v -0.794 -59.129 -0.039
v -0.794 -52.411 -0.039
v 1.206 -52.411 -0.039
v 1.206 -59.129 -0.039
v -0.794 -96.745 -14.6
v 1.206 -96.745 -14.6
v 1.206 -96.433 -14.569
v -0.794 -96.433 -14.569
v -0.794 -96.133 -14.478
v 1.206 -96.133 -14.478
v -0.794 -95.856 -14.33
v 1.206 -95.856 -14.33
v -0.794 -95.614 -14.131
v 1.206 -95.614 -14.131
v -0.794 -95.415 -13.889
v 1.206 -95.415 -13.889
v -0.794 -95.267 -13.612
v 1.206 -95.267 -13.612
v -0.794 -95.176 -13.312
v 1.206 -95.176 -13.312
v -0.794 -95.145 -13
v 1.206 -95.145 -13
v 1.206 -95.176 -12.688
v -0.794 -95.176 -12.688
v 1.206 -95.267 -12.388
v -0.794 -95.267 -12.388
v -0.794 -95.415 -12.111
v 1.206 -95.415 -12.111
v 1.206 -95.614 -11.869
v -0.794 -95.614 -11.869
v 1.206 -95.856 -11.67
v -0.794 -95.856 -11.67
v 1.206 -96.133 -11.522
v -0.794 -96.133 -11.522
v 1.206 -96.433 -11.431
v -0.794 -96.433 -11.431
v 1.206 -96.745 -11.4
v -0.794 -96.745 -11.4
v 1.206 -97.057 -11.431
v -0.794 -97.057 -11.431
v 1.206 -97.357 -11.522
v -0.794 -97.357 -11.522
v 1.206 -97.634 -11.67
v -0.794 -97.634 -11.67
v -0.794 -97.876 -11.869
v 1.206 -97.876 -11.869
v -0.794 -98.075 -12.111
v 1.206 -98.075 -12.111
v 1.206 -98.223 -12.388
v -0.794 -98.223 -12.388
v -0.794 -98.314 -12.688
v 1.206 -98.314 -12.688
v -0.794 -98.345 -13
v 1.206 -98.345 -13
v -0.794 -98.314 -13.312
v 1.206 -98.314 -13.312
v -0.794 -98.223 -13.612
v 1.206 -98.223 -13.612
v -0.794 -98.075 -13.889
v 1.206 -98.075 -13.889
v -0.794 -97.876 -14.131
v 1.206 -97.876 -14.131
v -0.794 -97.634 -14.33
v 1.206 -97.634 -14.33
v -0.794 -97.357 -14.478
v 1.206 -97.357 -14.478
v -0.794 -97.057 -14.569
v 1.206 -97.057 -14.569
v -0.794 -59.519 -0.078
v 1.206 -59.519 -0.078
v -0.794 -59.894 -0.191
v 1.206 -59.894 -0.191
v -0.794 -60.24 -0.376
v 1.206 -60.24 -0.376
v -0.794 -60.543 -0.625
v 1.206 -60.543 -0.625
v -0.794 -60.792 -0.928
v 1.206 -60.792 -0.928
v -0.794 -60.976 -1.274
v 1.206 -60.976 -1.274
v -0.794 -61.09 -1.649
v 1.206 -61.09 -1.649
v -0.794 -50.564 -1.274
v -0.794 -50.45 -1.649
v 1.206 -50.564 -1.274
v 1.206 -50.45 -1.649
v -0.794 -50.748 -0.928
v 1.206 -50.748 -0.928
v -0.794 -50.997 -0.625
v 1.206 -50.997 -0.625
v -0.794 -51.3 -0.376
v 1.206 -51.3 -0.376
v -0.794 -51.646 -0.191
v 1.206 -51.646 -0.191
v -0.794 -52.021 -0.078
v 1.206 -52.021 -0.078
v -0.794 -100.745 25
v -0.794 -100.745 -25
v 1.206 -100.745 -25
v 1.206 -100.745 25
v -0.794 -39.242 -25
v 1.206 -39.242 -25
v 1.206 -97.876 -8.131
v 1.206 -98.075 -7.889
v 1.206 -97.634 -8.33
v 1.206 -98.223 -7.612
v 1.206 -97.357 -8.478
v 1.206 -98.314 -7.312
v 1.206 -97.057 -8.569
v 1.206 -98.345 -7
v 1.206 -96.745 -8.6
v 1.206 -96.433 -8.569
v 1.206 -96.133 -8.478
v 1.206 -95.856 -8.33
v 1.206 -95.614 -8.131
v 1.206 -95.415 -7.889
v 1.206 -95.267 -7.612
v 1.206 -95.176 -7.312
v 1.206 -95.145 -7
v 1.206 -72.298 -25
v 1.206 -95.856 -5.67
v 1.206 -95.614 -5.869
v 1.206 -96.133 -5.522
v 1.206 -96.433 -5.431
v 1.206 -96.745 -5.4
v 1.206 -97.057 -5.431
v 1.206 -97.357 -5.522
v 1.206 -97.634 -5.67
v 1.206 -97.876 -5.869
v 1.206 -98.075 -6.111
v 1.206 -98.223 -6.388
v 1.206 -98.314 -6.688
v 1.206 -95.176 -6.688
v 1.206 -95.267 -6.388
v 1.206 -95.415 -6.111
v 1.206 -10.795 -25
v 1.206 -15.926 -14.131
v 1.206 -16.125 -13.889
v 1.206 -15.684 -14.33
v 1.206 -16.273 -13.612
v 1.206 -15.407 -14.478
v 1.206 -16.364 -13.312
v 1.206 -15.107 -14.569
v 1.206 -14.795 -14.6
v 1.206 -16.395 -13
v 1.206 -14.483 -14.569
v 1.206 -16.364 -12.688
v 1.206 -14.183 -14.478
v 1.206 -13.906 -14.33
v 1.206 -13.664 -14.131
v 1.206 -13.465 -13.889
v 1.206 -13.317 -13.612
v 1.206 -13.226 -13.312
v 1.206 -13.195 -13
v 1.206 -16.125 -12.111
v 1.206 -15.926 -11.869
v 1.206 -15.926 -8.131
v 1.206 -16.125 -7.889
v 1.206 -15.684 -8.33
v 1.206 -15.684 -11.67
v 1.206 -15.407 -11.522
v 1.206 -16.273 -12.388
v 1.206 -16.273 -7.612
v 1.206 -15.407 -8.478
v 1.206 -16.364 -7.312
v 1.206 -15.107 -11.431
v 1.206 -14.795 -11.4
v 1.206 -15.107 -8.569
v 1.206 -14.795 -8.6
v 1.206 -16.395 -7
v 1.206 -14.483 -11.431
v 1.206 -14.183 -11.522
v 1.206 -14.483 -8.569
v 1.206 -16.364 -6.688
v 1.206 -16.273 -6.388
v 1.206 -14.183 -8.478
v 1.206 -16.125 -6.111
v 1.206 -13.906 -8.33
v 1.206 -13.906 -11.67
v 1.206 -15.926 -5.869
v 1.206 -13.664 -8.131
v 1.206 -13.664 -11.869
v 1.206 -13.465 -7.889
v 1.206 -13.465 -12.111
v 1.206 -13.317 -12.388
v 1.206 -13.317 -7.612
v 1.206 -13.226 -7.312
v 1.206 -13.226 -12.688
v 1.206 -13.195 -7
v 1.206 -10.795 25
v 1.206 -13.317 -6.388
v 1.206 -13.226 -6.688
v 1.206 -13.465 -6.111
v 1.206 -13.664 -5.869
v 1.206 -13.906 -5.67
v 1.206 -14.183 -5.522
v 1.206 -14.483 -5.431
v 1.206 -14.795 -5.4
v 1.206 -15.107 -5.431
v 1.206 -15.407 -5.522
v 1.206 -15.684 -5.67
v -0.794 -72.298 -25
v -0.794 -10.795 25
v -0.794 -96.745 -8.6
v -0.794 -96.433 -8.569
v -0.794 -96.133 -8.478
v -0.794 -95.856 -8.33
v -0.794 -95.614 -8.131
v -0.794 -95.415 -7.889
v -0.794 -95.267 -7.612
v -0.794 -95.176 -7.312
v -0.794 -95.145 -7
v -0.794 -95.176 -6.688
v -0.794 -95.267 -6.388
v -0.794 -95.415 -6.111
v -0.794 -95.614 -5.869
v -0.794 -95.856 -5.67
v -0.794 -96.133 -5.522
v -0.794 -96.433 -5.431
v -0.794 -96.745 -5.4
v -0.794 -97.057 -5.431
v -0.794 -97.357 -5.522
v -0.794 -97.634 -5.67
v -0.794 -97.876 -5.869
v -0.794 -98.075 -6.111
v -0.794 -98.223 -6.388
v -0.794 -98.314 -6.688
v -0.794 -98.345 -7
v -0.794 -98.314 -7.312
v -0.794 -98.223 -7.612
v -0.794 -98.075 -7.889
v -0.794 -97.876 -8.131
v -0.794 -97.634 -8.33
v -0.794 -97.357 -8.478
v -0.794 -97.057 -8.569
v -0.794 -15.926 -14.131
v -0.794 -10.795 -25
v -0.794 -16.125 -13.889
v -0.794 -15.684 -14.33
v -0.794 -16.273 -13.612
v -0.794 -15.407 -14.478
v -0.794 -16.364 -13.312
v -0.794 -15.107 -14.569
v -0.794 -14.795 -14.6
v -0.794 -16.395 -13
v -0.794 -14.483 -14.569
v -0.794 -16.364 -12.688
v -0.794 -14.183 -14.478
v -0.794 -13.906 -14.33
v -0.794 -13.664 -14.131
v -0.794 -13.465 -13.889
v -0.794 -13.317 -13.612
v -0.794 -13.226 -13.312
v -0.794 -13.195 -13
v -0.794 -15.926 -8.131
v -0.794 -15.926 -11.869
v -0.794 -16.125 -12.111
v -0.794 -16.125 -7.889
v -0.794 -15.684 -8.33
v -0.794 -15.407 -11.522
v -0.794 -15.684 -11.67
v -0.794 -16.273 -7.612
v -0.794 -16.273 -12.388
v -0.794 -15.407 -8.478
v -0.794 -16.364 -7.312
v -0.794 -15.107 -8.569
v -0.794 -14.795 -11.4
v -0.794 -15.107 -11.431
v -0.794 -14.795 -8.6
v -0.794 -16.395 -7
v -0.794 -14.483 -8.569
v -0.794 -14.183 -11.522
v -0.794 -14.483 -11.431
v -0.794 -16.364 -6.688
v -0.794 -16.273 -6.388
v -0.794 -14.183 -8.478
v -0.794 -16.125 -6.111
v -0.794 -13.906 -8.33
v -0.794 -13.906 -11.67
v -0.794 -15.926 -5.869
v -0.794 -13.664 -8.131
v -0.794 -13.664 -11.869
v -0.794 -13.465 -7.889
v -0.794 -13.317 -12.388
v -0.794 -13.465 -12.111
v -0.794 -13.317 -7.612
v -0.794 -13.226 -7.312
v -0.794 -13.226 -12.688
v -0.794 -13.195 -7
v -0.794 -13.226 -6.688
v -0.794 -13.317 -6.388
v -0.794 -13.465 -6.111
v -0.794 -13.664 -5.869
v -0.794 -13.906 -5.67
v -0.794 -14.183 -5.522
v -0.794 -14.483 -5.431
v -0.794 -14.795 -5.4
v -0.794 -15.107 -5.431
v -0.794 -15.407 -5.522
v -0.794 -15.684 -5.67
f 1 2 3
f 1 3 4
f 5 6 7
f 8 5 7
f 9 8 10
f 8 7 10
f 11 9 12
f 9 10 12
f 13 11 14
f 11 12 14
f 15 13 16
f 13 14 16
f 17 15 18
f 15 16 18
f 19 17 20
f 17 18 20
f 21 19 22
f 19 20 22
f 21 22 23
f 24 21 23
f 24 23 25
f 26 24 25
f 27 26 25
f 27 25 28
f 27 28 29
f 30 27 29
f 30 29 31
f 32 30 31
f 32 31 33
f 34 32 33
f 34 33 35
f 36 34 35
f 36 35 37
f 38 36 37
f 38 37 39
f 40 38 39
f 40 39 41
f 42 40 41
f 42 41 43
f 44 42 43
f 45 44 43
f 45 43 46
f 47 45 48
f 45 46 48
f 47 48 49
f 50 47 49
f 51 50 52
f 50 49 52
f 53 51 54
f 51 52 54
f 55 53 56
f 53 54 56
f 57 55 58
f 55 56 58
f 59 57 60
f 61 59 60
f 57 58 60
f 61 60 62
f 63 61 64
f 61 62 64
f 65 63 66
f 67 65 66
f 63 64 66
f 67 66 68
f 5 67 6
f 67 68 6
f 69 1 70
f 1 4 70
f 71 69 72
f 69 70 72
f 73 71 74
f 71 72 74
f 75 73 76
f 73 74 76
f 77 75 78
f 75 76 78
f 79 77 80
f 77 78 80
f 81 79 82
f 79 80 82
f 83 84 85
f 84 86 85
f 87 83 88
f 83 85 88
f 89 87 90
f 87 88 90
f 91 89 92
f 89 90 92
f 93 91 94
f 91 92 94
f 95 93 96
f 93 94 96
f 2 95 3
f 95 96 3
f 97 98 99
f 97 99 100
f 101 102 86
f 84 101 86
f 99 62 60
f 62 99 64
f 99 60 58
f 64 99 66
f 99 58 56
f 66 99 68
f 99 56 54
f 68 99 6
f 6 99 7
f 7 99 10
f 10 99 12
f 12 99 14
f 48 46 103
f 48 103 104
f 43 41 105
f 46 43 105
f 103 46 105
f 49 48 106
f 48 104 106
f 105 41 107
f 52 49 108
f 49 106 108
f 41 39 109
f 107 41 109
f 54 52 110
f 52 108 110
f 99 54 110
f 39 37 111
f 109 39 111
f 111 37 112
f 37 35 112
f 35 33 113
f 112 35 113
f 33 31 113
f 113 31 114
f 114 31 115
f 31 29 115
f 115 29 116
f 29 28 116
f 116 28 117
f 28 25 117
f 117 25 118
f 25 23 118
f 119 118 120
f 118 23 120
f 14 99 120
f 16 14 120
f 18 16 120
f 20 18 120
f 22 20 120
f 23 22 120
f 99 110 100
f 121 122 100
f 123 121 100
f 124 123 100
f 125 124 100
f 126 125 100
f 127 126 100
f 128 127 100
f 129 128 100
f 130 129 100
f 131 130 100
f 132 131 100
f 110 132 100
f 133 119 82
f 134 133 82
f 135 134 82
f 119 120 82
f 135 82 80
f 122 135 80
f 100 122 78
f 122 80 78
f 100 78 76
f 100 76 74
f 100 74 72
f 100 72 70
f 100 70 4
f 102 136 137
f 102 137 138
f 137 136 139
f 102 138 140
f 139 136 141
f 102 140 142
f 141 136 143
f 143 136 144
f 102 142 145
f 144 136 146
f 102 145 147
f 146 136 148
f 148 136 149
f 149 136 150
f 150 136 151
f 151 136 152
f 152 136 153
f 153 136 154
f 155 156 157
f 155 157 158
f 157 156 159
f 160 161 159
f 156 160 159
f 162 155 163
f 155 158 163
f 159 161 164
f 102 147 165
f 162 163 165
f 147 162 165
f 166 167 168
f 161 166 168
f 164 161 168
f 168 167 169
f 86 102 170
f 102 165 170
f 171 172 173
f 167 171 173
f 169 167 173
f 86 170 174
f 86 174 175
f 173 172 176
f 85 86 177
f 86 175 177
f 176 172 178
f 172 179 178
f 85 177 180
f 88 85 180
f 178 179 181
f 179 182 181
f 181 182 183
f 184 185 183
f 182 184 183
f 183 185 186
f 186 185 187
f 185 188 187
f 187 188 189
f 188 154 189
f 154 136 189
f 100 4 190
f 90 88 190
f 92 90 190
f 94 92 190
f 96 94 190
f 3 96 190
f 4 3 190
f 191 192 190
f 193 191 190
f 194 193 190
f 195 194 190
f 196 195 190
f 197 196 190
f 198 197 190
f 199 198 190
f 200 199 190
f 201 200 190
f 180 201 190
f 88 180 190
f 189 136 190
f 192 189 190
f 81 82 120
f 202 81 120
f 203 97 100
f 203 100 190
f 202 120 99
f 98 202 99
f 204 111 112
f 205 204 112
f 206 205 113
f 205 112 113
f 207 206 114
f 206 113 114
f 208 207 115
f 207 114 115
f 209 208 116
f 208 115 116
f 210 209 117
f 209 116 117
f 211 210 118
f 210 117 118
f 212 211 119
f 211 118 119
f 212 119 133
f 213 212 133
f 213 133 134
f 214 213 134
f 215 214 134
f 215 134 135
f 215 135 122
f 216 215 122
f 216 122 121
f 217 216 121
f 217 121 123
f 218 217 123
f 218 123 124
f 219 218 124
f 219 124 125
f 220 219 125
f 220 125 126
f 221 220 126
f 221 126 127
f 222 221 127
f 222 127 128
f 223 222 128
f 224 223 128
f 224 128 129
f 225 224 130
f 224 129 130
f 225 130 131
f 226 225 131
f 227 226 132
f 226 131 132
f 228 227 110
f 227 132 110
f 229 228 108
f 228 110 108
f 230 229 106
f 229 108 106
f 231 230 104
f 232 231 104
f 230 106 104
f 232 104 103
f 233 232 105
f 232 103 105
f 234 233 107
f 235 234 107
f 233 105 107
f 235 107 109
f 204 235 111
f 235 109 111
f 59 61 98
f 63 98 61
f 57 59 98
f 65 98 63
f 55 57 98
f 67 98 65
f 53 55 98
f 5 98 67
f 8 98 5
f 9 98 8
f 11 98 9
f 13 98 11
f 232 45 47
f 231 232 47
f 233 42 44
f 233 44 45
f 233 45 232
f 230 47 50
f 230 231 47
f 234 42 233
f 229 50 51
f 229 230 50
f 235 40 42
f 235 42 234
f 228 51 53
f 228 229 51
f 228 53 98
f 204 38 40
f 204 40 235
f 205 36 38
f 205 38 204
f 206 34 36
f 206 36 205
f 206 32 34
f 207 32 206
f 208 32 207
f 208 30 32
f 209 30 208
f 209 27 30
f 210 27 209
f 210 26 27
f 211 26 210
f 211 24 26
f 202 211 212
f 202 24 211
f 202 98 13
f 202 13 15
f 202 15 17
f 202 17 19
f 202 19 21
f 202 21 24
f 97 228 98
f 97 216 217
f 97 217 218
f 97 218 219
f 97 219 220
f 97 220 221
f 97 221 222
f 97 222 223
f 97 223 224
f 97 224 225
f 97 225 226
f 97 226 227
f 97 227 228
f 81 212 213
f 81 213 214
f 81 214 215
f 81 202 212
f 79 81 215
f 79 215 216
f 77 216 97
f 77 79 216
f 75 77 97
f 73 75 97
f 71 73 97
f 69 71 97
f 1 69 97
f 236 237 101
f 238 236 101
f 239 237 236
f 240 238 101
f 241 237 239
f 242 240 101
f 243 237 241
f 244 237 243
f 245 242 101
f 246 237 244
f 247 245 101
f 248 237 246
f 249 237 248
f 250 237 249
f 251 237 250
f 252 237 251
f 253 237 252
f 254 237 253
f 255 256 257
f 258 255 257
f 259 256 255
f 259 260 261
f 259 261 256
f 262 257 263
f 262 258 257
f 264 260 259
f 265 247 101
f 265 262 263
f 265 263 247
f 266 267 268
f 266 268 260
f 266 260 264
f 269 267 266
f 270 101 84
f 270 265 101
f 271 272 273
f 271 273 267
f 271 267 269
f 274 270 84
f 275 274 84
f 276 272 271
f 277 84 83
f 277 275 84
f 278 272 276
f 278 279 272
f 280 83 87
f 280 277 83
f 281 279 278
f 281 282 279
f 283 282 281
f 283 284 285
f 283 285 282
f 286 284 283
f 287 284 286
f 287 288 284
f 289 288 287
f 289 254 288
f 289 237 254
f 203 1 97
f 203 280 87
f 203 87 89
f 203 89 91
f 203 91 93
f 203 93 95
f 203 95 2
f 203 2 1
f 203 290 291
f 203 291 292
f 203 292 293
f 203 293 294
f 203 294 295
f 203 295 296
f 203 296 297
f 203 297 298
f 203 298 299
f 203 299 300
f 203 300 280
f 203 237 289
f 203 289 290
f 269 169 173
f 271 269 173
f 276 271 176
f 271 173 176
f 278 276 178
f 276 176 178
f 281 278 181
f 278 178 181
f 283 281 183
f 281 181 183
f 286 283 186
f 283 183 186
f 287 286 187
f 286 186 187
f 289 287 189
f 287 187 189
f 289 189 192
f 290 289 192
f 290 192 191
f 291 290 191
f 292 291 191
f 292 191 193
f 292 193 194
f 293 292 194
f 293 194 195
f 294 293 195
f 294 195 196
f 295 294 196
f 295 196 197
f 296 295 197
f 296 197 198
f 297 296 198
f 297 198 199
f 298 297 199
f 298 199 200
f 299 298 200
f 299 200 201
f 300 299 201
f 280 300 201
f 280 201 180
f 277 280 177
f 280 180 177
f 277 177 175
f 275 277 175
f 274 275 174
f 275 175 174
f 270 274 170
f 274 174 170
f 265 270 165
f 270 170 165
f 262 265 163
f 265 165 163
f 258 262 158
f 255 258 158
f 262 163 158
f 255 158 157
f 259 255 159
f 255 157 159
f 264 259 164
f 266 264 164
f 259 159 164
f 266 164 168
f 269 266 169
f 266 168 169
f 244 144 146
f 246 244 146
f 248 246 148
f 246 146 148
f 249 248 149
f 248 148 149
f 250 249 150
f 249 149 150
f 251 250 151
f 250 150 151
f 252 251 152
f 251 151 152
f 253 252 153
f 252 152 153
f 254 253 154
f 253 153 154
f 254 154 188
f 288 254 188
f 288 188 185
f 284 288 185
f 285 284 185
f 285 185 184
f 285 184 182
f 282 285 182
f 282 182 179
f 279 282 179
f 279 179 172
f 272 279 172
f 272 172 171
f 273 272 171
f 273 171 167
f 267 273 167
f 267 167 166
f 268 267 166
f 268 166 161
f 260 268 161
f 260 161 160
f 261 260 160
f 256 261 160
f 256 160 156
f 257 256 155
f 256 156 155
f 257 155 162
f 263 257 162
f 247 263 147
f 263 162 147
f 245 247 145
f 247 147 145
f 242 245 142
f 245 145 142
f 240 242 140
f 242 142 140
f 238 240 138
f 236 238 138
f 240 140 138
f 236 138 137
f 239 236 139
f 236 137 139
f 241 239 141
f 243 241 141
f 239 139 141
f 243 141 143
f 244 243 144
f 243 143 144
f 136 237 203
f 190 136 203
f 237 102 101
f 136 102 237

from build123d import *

# Parameters (mm, degrees)
EXTRUDE_1_DEPTH     = 2
FILLET_1_R          = 2
FILLET_2_R          = 2
FILLET_3_R          = 2
FILLET_4_R          = 2
SKETCH_2_W          = 12
SKETCH_2_H          = 89.95
EXTRUDE_2_DEPTH     = 2
CUT_EXTRUDE_1_DEPTH = 10
SKETCH_6_R          = 1.6
CUT_EXTRUDE_2_DEPTH = 10
SKETCH_7_W          = 10
SKETCH_7_H          = 89.95
EXTRUDE_3_DEPTH     = 2


with BuildPart() as part:
    # 草图1 → 凸台-拉伸1 (new body)
    with BuildSketch(Plane(origin=(-0.79375, 0, 0), x_dir=(0, -1, 0), z_dir=(-1, 0, 0))):
        with BuildLine():
            Line((38.795, 5), (12.795, 5))
            ThreePointArc((12.795, 5), (11.380786438, 4.414213562), (10.795, 3))
            Line((10.795, 3), (10.795, -13))
            ThreePointArc((10.795, -13), (11.380786438, -14.414213562), (12.795, -15))
            Line((12.795, -15), (47.795, -15))
            Line((47.795, -15), (50.77, -0.039144756))
            Line((50.77, -0.039144756), (55.77, -0.039144756))
            Line((55.77, -0.039144756), (60.77, -0.039144756))
            Line((60.77, -0.039144756), (63.745, -15))
            Line((63.745, -15), (98.745, -15))
            ThreePointArc((98.745, -15), (100.159213562, -14.414213562), (100.745, -13))
            Line((100.745, -13), (100.745, 3))
            ThreePointArc((100.745, 3), (100.159213562, 4.414213562), (98.745, 5))
            Line((98.745, 5), (72.745, 5))
            Line((72.745, 5), (38.795, 5))
        make_face()
    extrude(amount=-EXTRUDE_1_DEPTH)

    # 圆角1
    fillet_1_edges = [part.edges().sort_by_distance(p)[0] for p in [
        (0.20625, -47.795, -15),
    ]]
    fillet(fillet_1_edges, radius=FILLET_1_R)

    # 圆角2
    fillet_2_edges = [part.edges().sort_by_distance(p)[0] for p in [
        (0.20625, -50.77, -0.039144756),
    ]]
    fillet(fillet_2_edges, radius=FILLET_2_R)

    # 圆角3
    fillet_3_edges = [part.edges().sort_by_distance(p)[0] for p in [
        (0.20625, -60.77, -0.039144756),
    ]]
    fillet(fillet_3_edges, radius=FILLET_3_R)

    # 圆角4
    fillet_4_edges = [part.edges().sort_by_distance(p)[0] for p in [
        (0.20625, -63.745, -15),
    ]]
    fillet(fillet_4_edges, radius=FILLET_4_R)

    # 草图2 → 凸台-拉伸2 (add)
    with BuildSketch(Plane(origin=(1.20625, 0, 0), x_dir=(0, 0, -1), z_dir=(1, 0, 0))):
        with Locations((-9, -55.77)):
            Rectangle(SKETCH_2_W, SKETCH_2_H)
        Polygon((13.39006724, -48.115138781), (25, -45.806477318), (25, -10.795), (13, -10.795), align=None)
        Polygon((13.39006724, -63.424861219), (25, -65.733522682), (25, -100.745), (13, -100.745), align=None)
    extrude(amount=-EXTRUDE_2_DEPTH)

    # 草图5 → 切除-拉伸1 (cut)
    with BuildSketch(Plane(origin=(1.20625, 0, 0), x_dir=(0, 0, -1), z_dir=(1, 0, 0))):
        Polygon((1.649077515, -50.449861219), (25, -45.806477318), (25, -39.241825321), align=None)
        Polygon((1.649077515, -61.090138781), (25, -72.298174679), (25, -65.733522682), align=None)
    extrude(amount=-CUT_EXTRUDE_1_DEPTH, mode=Mode.SUBTRACT)

    # 草图6 → 切除-拉伸2 (cut)
    with BuildSketch(Plane(origin=(1.20625, 0, 0), x_dir=(0, 0, -1), z_dir=(1, 0, 0))):
        with Locations((13, -14.795)):
            Circle(SKETCH_6_R)
        with Locations((7, -14.795)):
            Circle(SKETCH_6_R)
        with Locations((13, -96.745)):
            Circle(SKETCH_6_R)
        with Locations((7, -96.745)):
            Circle(SKETCH_6_R)
    extrude(amount=-CUT_EXTRUDE_2_DEPTH, mode=Mode.SUBTRACT)

    # 草图7 → 凸台-拉伸3 (add)
    with BuildSketch(Plane.ZY.offset(0.79375)):
        with Locations((20, -55.77)):
            Rectangle(SKETCH_7_W, SKETCH_7_H)
    extrude(amount=-EXTRUDE_3_DEPTH)


solid = part.part
